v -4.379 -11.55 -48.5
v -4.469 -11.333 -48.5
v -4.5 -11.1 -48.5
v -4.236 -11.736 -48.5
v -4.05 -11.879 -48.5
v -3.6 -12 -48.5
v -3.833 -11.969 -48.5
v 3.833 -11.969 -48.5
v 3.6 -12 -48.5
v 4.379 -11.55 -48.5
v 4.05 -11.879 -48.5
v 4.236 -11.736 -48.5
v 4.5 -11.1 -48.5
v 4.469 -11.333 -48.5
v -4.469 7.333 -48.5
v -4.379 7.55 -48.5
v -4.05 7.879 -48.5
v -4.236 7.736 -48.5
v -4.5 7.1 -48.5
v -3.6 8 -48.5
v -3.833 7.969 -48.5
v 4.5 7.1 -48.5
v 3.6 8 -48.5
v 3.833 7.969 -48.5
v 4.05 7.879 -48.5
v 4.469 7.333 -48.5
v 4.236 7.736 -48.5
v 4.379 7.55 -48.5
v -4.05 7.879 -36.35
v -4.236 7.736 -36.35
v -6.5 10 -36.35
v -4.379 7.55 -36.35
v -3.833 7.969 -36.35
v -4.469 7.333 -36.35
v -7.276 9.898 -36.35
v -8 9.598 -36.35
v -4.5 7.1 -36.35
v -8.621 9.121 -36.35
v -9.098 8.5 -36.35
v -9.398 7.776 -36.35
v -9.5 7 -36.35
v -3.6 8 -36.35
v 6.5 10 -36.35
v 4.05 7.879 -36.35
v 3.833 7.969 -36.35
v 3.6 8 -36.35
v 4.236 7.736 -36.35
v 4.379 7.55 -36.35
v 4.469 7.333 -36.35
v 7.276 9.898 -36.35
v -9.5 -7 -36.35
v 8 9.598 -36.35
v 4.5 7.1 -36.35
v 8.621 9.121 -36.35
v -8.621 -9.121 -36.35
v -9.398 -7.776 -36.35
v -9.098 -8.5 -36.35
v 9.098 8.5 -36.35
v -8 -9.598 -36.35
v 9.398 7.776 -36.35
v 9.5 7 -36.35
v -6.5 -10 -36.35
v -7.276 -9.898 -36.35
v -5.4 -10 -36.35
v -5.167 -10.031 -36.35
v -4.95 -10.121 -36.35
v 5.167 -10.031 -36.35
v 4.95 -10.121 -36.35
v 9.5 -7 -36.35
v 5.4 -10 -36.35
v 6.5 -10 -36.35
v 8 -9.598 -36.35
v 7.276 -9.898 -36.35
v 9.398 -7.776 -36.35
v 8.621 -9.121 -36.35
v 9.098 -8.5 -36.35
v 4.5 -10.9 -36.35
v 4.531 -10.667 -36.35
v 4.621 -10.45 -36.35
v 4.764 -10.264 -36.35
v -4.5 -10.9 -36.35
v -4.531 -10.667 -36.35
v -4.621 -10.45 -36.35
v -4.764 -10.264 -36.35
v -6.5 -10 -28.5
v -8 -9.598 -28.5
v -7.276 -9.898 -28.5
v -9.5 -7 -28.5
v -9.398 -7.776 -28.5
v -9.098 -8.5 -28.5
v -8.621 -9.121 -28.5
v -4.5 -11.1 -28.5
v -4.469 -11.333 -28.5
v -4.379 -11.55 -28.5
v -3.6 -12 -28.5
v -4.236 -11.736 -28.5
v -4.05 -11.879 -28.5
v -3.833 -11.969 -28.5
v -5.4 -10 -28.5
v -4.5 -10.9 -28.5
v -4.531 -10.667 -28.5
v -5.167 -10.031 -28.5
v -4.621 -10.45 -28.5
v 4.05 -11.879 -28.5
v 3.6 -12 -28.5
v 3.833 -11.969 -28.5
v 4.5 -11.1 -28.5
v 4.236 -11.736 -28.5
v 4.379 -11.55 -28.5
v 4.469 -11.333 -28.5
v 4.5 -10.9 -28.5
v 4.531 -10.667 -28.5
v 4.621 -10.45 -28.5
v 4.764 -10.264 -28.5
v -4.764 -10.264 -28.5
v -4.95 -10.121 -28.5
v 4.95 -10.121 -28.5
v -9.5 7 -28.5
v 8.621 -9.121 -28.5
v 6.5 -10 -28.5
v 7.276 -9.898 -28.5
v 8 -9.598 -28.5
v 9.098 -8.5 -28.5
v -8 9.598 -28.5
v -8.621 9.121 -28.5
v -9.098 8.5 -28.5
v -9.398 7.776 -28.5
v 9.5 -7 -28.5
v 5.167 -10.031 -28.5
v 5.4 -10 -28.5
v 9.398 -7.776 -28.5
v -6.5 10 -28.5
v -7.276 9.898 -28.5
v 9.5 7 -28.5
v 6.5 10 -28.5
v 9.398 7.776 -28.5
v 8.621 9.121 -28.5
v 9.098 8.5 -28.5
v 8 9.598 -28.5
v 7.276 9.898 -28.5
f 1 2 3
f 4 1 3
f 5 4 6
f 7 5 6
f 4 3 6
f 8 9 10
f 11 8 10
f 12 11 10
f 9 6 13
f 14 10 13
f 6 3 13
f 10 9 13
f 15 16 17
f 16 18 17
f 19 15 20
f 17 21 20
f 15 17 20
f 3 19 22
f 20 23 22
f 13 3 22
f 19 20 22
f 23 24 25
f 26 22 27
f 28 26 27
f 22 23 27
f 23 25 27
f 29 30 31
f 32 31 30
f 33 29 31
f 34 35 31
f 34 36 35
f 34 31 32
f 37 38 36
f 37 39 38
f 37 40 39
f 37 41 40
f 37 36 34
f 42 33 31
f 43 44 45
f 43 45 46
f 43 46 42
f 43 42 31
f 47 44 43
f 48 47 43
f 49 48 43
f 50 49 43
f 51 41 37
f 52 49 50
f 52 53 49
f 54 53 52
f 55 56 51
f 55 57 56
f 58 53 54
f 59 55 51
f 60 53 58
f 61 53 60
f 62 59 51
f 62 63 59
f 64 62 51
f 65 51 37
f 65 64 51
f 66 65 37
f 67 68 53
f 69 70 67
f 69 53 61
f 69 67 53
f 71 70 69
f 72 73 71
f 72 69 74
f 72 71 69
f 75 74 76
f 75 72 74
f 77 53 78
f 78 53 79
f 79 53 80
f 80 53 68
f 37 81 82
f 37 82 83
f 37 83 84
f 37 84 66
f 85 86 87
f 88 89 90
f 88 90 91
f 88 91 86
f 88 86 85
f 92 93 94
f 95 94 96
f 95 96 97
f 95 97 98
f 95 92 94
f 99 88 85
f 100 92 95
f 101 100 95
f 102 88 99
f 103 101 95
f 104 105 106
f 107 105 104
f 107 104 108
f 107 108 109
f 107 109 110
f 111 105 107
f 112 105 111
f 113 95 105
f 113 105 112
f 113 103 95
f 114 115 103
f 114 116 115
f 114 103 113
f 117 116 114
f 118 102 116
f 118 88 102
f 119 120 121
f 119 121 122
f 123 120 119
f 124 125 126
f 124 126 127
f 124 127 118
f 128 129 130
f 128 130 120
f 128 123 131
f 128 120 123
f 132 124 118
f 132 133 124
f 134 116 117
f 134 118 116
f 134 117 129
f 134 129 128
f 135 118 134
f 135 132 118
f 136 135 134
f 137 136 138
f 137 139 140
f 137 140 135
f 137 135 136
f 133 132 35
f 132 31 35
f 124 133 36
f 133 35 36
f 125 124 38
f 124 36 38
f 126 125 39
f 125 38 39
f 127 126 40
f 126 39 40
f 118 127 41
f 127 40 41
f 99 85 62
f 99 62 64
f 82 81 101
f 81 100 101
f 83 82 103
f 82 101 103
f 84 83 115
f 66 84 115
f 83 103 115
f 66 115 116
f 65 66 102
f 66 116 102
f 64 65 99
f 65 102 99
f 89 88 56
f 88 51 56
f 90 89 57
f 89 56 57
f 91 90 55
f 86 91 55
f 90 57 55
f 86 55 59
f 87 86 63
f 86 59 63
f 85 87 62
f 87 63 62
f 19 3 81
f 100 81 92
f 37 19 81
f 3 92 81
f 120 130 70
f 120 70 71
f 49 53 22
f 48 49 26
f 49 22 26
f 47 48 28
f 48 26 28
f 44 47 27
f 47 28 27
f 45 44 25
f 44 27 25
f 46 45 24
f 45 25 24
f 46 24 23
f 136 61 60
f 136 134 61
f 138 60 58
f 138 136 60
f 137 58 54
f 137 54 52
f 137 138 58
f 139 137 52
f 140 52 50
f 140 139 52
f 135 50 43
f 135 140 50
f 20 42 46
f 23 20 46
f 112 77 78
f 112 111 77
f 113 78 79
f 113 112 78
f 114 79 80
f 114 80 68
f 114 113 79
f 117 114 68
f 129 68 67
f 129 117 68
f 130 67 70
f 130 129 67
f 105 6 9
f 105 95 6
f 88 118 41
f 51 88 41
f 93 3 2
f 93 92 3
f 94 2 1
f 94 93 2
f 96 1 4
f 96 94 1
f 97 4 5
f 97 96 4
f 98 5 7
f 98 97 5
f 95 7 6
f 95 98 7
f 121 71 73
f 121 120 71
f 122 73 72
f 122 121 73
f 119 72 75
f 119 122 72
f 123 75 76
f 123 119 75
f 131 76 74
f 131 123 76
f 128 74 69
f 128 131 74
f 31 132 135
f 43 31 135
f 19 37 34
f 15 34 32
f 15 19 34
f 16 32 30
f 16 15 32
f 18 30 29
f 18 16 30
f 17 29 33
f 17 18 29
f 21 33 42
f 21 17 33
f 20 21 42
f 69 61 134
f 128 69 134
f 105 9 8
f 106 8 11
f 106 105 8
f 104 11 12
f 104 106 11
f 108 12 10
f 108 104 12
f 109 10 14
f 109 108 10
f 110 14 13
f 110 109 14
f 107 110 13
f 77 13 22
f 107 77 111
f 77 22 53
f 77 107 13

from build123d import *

# Parameters (mm, degrees)
PAD001_DEPTH = 10
SKETCH003_W  = 9
SKETCH003_H  = 20
PAD002_DEPTH = 2
SKETCH004_W  = 9
SKETCH004_H  = 12.15
POCKET_DEPTH = 2
FILLET_R     = 0.9
FILLET001_R  = 3


with BuildPart() as part:
    # Sketch002 → Pad001 (new body, symmetric)
    with BuildSketch(Plane.XZ):
        Polygon((-9.5, 0), (-9.5, -7.85), (-4.5, -7.85), (-4.5, -20), (4.5, -20), (4.5, -7.85), (9.5, -7.85), (9.5, 0), align=None)
    extrude(amount=PAD001_DEPTH, both=True)

    # Sketch003 (on Face10 of Pad001) → Pad002 (join)
    with BuildSketch(Plane.XZ.offset(10)):
        with Locations((0, -10)):
            Rectangle(SKETCH003_W, SKETCH003_H)
    extrude(amount=PAD002_DEPTH)

    # Sketch004 (on Face3 of Pad002) → Pocket (cut)
    with BuildSketch(Plane(origin=(0, 10, 0), x_dir=(1, 0, 0), z_dir=(0, 1, 0))):
        with Locations((0, 13.925)):
            Rectangle(SKETCH004_W, SKETCH004_H)
    extrude(amount=-POCKET_DEPTH, mode=Mode.SUBTRACT)

    # Fillet
    fillet_edges = [part.edges().sort_by_distance(p)[0] for p in [
        (-4.5, -12, -10),
        (4.5, -12, -10),
        (4.5, 8, -13.925),
        (-4.5, 8, -13.925),
        (4.5, -10, -3.925),
        (-4.5, -10, -3.925),
    ]]
    fillet(fillet_edges, radius=FILLET_R)

    # Fillet001
    fillet001_edges = [part.edges().sort_by_distance(p)[0] for p in [
        (-9.5, -10, -3.925),
        (-9.5, 10, -3.925),
        (9.5, -10, -3.925),
        (9.5, 10, -3.925),
    ]]
    fillet(fillet001_edges, radius=FILLET001_R)


with BuildPart() as part_1:
    # Body001 placement: moved
    add(part.part.moved(Location((0, 0, -28.5))))


solid = part_1.part
